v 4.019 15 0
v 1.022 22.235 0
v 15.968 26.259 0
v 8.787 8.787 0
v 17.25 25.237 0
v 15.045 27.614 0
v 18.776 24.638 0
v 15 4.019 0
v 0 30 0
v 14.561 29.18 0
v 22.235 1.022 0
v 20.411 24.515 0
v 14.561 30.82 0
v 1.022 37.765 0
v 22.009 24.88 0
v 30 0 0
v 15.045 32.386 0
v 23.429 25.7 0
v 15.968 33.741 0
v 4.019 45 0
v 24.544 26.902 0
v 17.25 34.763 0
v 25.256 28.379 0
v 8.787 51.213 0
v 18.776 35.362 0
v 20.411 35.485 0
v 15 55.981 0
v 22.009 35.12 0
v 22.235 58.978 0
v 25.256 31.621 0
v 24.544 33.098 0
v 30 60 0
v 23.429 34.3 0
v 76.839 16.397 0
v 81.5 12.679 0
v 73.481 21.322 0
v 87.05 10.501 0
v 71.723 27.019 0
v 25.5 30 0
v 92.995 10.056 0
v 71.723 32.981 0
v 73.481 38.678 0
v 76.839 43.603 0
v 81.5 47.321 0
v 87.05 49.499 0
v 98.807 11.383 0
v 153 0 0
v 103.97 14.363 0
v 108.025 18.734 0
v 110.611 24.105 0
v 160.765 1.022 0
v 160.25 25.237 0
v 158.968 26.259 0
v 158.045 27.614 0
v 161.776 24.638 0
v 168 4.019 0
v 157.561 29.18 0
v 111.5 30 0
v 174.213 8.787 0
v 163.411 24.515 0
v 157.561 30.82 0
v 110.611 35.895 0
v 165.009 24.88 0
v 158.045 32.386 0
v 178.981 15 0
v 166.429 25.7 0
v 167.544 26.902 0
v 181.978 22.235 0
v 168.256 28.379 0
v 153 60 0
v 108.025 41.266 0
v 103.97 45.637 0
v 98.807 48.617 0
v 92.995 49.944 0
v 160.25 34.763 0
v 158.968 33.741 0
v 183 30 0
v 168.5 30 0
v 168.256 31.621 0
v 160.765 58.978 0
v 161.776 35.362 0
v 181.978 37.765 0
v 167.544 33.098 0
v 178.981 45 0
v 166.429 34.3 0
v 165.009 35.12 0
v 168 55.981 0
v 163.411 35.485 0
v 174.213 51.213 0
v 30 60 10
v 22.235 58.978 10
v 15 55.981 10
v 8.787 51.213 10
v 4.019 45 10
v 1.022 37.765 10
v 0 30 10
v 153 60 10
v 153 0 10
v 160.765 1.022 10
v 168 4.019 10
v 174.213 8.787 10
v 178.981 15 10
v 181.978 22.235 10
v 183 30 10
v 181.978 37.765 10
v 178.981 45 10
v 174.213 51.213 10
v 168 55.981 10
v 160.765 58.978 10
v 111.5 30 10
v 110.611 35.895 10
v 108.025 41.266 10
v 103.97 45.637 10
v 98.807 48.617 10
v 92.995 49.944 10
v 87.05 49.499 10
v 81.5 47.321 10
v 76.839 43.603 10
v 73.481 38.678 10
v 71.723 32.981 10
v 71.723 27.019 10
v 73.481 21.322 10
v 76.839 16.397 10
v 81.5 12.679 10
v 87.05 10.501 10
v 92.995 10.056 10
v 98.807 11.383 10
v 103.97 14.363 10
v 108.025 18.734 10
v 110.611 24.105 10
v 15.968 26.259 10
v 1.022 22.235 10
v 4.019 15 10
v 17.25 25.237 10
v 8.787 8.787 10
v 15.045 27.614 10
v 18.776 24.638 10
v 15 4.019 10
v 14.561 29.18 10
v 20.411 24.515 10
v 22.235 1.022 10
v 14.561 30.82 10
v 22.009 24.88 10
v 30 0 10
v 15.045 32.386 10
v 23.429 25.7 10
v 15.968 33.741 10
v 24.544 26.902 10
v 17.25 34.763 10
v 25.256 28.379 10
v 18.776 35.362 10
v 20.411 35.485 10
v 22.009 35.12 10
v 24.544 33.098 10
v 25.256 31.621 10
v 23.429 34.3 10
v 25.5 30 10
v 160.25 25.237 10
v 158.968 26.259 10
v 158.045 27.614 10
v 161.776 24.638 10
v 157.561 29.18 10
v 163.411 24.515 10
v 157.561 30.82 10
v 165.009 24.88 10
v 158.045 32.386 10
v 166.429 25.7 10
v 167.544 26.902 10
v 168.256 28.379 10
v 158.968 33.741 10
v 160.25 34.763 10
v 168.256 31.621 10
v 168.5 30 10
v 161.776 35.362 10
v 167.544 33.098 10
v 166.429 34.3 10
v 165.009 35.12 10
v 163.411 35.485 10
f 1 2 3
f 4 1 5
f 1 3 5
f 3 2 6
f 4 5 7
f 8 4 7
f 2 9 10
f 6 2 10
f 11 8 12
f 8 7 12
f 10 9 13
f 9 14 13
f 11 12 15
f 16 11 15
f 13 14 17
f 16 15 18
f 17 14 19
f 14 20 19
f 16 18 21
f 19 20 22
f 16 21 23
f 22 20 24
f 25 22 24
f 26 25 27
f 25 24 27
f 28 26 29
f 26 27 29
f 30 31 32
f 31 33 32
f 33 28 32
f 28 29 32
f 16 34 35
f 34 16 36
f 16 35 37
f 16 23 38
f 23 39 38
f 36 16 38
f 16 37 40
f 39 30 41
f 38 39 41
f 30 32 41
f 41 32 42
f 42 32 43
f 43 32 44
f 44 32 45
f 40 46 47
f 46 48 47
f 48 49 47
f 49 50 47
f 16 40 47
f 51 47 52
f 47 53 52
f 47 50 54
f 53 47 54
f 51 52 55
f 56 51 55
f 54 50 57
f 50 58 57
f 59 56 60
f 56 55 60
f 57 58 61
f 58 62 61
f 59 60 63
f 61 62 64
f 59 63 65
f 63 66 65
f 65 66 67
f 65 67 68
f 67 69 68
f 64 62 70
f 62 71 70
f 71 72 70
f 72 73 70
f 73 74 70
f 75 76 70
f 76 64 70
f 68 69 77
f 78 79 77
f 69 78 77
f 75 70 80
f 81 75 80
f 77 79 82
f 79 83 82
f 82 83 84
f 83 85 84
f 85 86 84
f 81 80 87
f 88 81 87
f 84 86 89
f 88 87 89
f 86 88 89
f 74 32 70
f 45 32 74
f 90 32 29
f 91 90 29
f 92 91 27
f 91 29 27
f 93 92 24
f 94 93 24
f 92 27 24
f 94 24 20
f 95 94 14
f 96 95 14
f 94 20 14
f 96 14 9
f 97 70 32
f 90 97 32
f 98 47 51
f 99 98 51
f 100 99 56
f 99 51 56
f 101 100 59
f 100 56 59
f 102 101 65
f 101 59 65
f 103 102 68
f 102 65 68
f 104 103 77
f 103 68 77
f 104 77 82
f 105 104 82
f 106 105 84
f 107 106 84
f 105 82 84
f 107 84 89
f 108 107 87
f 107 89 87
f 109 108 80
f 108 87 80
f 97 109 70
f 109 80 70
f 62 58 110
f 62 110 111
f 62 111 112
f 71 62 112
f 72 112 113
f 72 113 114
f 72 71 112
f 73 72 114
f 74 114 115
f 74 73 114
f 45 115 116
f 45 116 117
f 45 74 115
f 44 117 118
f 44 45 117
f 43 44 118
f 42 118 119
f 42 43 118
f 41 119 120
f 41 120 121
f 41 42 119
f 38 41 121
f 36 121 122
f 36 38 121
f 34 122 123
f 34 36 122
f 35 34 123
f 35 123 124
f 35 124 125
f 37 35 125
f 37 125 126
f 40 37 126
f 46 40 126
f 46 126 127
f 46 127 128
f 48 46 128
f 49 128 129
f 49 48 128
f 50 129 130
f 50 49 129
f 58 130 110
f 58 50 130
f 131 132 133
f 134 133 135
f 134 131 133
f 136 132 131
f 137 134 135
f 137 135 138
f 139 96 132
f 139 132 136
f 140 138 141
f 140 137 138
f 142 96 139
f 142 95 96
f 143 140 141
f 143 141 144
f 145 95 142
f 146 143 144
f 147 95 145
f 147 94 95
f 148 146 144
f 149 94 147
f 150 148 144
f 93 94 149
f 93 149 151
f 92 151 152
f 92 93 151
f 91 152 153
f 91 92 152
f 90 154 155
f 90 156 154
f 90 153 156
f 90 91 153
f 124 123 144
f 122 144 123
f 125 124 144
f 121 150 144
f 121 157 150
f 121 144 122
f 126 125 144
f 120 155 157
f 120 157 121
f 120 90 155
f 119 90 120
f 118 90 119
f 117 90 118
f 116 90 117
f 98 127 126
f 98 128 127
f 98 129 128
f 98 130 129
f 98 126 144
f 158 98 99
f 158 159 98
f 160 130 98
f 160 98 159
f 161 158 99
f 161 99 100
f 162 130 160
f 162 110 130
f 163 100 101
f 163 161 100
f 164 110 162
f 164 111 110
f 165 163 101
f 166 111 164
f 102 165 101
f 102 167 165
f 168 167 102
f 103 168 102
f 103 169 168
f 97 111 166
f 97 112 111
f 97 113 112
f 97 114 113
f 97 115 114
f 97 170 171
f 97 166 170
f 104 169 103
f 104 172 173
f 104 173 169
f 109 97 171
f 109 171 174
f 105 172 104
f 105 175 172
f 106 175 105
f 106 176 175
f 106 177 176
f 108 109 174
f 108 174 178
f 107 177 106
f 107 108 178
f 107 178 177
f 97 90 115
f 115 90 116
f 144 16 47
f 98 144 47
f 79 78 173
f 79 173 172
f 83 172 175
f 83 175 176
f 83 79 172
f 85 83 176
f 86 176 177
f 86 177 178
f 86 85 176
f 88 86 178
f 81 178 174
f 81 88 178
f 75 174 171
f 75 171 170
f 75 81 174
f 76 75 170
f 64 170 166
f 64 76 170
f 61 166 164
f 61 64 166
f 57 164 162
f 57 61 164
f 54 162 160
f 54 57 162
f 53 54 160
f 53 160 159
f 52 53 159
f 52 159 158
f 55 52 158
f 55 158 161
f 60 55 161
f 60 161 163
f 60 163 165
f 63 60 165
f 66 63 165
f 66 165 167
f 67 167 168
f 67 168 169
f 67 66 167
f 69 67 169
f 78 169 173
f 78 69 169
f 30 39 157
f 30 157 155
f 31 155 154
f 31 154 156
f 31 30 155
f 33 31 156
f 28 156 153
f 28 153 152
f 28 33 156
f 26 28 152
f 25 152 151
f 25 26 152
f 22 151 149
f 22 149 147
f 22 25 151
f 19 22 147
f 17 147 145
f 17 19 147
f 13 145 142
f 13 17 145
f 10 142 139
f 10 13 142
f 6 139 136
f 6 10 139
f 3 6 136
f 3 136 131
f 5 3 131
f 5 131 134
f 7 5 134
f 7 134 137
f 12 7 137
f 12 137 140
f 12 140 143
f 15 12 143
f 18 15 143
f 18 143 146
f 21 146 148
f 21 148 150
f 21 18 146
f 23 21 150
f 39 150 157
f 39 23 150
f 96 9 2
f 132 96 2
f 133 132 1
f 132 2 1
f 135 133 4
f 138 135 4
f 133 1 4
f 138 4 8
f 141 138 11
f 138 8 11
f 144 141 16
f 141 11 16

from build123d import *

# Parameters (mm, degrees)
F0_R     = 5.5
F0_R_2   = 20
F1_DEPTH = 10


with BuildPart() as f1:
    # F0 (on Top) → F1 (new body)
    with BuildSketch(Plane.XY):
        with BuildLine():
            ThreePointArc((0, 30), (8.786797, 8.786797), (30, 0))
            Line((30, 0), (153, 0))
            ThreePointArc((153, 0), (174.213203, 8.786797), (183, 30))
            ThreePointArc((183, 30), (174.213203, 51.213203), (153, 60))
            Line((153, 60), (30, 60))
            ThreePointArc((30, 60), (8.786797, 51.213203), (0, 30))
        make_face()
        with Locations((20, 30)):
            Circle(F0_R, mode=Mode.SUBTRACT)
        with Locations((91.5, 30)):
            Circle(F0_R_2, mode=Mode.SUBTRACT)
        with Locations((163, 30)):
            Circle(F0_R, mode=Mode.SUBTRACT)
    extrude(amount=F1_DEPTH)


solid = f1.part
